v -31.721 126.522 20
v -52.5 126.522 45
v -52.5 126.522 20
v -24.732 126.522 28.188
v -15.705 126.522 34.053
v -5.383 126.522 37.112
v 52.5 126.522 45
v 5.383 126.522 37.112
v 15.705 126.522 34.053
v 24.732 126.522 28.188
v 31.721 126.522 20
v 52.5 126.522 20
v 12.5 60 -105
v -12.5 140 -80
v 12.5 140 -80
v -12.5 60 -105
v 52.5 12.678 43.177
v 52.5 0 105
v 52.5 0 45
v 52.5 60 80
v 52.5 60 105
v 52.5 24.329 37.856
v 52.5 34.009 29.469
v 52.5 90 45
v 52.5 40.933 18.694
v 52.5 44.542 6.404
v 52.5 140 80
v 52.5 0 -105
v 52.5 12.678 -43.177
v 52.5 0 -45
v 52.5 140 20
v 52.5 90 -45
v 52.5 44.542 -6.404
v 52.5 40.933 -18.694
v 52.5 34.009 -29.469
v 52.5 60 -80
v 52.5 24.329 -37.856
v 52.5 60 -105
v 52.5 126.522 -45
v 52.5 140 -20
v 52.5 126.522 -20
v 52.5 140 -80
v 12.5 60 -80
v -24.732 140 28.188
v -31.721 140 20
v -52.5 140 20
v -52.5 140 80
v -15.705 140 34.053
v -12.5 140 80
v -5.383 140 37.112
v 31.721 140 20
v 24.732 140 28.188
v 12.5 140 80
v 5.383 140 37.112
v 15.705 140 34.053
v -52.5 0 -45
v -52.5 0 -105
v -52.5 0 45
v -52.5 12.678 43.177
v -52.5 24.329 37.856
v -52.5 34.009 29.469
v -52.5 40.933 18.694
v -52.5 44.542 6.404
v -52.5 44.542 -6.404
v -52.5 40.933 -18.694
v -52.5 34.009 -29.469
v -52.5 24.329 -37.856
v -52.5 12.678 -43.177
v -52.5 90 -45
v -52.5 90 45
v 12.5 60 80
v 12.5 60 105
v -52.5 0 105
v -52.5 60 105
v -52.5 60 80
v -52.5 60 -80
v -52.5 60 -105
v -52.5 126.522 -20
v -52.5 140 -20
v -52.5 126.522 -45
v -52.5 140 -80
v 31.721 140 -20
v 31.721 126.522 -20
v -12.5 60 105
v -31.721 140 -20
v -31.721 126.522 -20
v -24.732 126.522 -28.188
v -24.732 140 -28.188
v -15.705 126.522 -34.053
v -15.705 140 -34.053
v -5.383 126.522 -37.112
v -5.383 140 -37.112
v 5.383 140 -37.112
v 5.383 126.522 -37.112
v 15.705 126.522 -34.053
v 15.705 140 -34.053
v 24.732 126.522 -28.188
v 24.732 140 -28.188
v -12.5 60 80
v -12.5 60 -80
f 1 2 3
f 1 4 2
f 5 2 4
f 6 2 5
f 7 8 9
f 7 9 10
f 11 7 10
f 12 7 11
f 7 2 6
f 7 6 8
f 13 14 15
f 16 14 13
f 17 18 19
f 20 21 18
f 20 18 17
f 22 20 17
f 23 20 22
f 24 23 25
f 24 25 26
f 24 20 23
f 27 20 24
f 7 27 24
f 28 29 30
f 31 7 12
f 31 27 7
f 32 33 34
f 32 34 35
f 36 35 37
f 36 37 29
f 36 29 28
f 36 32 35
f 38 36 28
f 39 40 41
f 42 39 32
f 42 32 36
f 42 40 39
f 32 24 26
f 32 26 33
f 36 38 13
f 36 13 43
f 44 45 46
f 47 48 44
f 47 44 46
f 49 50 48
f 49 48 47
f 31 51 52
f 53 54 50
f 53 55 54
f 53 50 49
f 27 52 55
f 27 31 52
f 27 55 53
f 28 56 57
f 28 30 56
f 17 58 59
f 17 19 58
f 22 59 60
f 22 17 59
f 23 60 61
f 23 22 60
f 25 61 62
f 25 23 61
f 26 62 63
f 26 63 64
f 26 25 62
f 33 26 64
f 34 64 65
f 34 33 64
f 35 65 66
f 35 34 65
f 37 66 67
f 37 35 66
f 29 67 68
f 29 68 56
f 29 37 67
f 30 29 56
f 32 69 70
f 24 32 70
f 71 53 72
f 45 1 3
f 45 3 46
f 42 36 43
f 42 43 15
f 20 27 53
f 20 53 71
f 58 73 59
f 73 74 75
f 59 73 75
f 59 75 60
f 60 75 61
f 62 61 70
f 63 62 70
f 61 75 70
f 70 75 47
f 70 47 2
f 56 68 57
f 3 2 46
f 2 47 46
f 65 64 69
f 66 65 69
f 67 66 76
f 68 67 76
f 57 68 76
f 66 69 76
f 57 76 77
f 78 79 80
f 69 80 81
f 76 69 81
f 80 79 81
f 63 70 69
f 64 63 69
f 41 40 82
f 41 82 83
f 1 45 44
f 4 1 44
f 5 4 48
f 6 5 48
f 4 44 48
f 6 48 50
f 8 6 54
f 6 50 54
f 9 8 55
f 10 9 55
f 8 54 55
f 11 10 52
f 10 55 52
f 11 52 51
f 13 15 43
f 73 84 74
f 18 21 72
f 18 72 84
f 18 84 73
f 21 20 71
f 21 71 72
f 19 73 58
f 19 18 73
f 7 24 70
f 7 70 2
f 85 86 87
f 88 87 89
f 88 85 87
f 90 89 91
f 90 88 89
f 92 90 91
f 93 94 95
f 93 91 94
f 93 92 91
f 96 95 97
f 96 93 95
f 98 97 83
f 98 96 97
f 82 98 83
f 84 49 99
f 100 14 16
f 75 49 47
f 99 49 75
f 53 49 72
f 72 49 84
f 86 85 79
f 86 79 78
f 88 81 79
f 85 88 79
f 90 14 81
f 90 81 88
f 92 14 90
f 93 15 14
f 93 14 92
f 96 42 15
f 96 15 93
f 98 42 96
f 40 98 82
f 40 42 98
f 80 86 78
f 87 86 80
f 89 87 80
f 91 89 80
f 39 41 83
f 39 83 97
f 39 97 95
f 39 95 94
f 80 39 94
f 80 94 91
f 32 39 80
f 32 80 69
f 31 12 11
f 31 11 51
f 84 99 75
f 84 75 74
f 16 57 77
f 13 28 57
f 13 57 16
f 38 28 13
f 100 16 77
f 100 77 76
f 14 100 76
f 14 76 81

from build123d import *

# Parameters (mm, degrees)
BOSS_EXTRUDE1_DEPTH = 52.5
RIB1_REACH          = 184.705
SKETCH3_WALL_W      = 451.226000884
SKETCH3_WALL_H      = 25
RIB2_REACH          = 184.705
SKETCH2_WALL_W      = 451.226000884
SKETCH2_WALL_H      = 25
CUT_EXTRUDE1_DEPTH  = 31


with BuildPart() as part:
    # Sketch1 → Boss-Extrude1 (new, symmetric)
    with BuildSketch(Plane(origin=(0, 0, 0), x_dir=(0, 0, -1), z_dir=(1, 0, 0))):
        with BuildLine():
            Line((45, 0), (105, 0))
            Line((105, 0), (105, 60))
            Line((105, 60), (80, 60))
            Line((80, 60), (80, 140))
            Line((80, 140), (20, 140))
            Line((20, 140), (20, 126.52173913))
            Line((20, 126.52173913), (45, 126.52173913))
            Line((45, 126.52173913), (45, 90))
            Line((45, 90), (-45, 90))
            Line((-45, 90), (-45, 126.52173913))
            Line((-45, 126.52173913), (-20, 126.52173913))
            Line((-20, 126.52173913), (-20, 140))
            Line((-20, 140), (-80, 140))
            Line((-80, 140), (-80, 60))
            Line((-80, 60), (-105, 60))
            Line((-105, 60), (-105, 0))
            Line((-105, 0), (-45, 0))
            ThreePointArc((-45, 0), (0, 45), (45, 0))
        make_face()
    extrude(amount=BOSS_EXTRUDE1_DEPTH, both=True)

    # Sketch3 wall → Rib1 (add, up to next)
    with BuildSketch(Plane(origin=(0, 100, 92.5), x_dir=(0, -0.954479978035, 0.298274993136), z_dir=(0, -0.298274993136, -0.954479978035)), mode=Mode.PRIVATE) as rib1_sk1:
        Rectangle(SKETCH3_WALL_W, SKETCH3_WALL_H)
    rib1_tool1 = extrude(rib1_sk1.sketch, amount=RIB1_REACH, mode=Mode.PRIVATE) - part.part
    add(rib1_tool1.solids().sort_by_distance((0, 100, 92.5))[0])

    # Sketch2 wall → Rib2 (add, up to next)
    with BuildSketch(Plane(origin=(0, 100, -92.5), x_dir=(0, -0.954479978035, -0.298274993136), z_dir=(0, 0.298274993136, -0.954479978035)), mode=Mode.PRIVATE) as rib2_sk1:
        Rectangle(SKETCH2_WALL_W, SKETCH2_WALL_H)
    rib2_tool1 = extrude(rib2_sk1.sketch, amount=-RIB2_REACH, mode=Mode.PRIVATE) - part.part
    add(rib2_tool1.solids().sort_by_distance((0, 100, -92.5))[0])

    # Sketch5 → Cut-Extrude1 (cut)
    with BuildSketch(Plane(origin=(0, 140, 0), x_dir=(1, 0, 0), z_dir=(0, 1, 0))):
        with BuildLine():
            Line((31.721443851, -20), (-31.721443851, -20))
            ThreePointArc((-31.721443851, -20), (0, -37.5), (31.721443851, -20))
        make_face()
        with BuildLine():
            Line((31.721443851, 20), (-31.721443851, 20))
            ThreePointArc((-31.721443851, 20), (0, 37.5), (31.721443851, 20))
        make_face()
    extrude(amount=-CUT_EXTRUDE1_DEPTH, mode=Mode.SUBTRACT)


solid = part.part
